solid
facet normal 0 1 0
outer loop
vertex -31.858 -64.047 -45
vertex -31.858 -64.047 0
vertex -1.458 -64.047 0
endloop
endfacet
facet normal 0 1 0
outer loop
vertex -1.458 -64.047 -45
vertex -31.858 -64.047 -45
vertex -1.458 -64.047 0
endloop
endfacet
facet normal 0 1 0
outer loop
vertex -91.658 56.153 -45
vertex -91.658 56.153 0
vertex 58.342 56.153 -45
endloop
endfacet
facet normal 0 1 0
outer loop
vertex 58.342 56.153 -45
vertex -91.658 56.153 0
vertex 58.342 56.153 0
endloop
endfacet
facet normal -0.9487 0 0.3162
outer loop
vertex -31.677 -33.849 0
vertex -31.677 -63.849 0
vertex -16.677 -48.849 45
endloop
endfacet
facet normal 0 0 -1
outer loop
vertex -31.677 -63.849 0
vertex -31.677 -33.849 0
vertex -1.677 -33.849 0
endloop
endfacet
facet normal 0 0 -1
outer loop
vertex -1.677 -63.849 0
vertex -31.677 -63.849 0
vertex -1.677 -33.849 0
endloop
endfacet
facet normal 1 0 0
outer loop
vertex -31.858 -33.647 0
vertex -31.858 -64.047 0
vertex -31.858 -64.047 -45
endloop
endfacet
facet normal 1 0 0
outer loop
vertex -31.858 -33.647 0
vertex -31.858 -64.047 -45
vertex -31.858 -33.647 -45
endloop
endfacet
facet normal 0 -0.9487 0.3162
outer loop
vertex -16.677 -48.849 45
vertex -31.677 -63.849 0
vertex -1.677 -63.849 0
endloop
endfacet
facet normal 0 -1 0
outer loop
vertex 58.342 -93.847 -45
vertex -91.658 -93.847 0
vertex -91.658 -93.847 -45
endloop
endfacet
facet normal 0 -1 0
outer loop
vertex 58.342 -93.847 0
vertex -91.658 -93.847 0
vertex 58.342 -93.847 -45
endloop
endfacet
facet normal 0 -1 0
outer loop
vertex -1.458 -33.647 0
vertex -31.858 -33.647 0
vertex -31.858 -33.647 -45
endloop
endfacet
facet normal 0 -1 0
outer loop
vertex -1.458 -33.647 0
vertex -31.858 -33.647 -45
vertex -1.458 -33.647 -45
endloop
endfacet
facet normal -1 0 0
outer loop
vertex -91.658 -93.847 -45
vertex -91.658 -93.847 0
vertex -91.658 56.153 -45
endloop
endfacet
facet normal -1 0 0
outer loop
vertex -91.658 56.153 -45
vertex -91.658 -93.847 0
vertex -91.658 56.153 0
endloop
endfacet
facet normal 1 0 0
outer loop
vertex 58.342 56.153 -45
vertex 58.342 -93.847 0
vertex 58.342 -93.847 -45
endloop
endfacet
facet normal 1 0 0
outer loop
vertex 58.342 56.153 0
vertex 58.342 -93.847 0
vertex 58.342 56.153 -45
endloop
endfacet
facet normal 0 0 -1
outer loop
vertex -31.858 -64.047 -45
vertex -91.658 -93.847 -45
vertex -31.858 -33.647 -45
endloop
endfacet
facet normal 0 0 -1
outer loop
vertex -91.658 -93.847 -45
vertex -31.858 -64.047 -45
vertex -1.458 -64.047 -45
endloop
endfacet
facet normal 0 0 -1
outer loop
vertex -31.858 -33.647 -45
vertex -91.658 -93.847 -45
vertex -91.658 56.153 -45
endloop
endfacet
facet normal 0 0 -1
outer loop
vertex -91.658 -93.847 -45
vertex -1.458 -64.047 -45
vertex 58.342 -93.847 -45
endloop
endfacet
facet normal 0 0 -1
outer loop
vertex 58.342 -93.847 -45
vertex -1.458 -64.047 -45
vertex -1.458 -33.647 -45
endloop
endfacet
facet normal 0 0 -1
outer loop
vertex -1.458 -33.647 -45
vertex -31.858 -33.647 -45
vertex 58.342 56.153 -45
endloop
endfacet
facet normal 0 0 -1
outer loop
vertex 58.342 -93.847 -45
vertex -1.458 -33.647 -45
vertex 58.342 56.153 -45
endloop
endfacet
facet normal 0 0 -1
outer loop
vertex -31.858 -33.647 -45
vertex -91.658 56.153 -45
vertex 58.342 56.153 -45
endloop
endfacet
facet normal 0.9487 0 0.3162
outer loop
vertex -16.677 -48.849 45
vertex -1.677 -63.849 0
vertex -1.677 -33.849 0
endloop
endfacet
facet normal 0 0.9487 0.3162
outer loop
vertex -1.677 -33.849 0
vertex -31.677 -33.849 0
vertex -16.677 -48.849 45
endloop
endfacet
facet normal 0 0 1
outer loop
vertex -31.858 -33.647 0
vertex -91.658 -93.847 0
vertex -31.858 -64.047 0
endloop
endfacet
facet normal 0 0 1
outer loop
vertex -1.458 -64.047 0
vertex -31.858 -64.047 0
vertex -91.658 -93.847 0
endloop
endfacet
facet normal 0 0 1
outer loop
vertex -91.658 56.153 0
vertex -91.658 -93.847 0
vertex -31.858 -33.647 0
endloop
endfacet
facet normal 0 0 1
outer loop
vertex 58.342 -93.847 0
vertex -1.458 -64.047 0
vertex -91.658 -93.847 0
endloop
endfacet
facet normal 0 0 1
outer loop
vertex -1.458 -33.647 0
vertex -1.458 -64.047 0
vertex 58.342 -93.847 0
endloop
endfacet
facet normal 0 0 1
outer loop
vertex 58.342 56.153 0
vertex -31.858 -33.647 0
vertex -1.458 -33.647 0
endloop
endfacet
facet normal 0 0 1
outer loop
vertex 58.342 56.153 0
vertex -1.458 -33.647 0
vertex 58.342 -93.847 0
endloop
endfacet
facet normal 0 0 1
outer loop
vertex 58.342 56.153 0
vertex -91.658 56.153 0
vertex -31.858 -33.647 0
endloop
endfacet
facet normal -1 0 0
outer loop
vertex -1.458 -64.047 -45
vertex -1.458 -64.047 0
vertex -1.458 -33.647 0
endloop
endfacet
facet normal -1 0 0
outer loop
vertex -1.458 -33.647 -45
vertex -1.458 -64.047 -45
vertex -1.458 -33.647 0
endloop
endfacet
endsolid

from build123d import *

# Parameters (mm, degrees)
F0_W     = 150
F0_H     = 150
F0_W_2   = 30.4
F0_H_2   = 30.4
F1_DEPTH = 45
F2_W     = 30
F2_H     = 30
F3_DEPTH = 45
F4_SIZE2 = 14.99999
F4_SIZE  = 44.99999


# Not quite as in the source:
# - a fillet or chamfer is up to 0.001 mm smaller than in the source, because OpenCascade refuses the exact size


with BuildPart() as f1:
    # F0 (on Top) → F1 (new body)
    with BuildSketch(Plane.XY):
        with Locations((-16.6580903113, -18.8472156852)):
            Rectangle(F0_W, F0_H)
        with Locations((-16.6580903113, -48.8472156852)):
            Rectangle(F0_W_2, F0_H_2, mode=Mode.SUBTRACT)
    extrude(amount=-F1_DEPTH)


with BuildPart() as f3:
    # F2 (on Top) → F3 (new body)
    with BuildSketch(Plane.XY):
        with Locations((-16.6773743331, -48.8492193)):
            Rectangle(F2_W, F2_H)
    extrude(amount=F3_DEPTH)

    # F4 (size 45 and 15 in the source; OpenCascade refuses exactly that, so slightly less here)
    f4_edges = [f3.edges().sort_by_distance(p)[0] for p in [
        (-1.677374, -48.849219, 45),
        (-16.677374, -33.849219, 45),
        (-31.677374, -48.849219, 45),
        (-16.677374, -63.849219, 45),
    ]]
    chamfer(f4_edges, length=F4_SIZE, length2=F4_SIZE2)


solid = Compound([f1.part, f3.part])
